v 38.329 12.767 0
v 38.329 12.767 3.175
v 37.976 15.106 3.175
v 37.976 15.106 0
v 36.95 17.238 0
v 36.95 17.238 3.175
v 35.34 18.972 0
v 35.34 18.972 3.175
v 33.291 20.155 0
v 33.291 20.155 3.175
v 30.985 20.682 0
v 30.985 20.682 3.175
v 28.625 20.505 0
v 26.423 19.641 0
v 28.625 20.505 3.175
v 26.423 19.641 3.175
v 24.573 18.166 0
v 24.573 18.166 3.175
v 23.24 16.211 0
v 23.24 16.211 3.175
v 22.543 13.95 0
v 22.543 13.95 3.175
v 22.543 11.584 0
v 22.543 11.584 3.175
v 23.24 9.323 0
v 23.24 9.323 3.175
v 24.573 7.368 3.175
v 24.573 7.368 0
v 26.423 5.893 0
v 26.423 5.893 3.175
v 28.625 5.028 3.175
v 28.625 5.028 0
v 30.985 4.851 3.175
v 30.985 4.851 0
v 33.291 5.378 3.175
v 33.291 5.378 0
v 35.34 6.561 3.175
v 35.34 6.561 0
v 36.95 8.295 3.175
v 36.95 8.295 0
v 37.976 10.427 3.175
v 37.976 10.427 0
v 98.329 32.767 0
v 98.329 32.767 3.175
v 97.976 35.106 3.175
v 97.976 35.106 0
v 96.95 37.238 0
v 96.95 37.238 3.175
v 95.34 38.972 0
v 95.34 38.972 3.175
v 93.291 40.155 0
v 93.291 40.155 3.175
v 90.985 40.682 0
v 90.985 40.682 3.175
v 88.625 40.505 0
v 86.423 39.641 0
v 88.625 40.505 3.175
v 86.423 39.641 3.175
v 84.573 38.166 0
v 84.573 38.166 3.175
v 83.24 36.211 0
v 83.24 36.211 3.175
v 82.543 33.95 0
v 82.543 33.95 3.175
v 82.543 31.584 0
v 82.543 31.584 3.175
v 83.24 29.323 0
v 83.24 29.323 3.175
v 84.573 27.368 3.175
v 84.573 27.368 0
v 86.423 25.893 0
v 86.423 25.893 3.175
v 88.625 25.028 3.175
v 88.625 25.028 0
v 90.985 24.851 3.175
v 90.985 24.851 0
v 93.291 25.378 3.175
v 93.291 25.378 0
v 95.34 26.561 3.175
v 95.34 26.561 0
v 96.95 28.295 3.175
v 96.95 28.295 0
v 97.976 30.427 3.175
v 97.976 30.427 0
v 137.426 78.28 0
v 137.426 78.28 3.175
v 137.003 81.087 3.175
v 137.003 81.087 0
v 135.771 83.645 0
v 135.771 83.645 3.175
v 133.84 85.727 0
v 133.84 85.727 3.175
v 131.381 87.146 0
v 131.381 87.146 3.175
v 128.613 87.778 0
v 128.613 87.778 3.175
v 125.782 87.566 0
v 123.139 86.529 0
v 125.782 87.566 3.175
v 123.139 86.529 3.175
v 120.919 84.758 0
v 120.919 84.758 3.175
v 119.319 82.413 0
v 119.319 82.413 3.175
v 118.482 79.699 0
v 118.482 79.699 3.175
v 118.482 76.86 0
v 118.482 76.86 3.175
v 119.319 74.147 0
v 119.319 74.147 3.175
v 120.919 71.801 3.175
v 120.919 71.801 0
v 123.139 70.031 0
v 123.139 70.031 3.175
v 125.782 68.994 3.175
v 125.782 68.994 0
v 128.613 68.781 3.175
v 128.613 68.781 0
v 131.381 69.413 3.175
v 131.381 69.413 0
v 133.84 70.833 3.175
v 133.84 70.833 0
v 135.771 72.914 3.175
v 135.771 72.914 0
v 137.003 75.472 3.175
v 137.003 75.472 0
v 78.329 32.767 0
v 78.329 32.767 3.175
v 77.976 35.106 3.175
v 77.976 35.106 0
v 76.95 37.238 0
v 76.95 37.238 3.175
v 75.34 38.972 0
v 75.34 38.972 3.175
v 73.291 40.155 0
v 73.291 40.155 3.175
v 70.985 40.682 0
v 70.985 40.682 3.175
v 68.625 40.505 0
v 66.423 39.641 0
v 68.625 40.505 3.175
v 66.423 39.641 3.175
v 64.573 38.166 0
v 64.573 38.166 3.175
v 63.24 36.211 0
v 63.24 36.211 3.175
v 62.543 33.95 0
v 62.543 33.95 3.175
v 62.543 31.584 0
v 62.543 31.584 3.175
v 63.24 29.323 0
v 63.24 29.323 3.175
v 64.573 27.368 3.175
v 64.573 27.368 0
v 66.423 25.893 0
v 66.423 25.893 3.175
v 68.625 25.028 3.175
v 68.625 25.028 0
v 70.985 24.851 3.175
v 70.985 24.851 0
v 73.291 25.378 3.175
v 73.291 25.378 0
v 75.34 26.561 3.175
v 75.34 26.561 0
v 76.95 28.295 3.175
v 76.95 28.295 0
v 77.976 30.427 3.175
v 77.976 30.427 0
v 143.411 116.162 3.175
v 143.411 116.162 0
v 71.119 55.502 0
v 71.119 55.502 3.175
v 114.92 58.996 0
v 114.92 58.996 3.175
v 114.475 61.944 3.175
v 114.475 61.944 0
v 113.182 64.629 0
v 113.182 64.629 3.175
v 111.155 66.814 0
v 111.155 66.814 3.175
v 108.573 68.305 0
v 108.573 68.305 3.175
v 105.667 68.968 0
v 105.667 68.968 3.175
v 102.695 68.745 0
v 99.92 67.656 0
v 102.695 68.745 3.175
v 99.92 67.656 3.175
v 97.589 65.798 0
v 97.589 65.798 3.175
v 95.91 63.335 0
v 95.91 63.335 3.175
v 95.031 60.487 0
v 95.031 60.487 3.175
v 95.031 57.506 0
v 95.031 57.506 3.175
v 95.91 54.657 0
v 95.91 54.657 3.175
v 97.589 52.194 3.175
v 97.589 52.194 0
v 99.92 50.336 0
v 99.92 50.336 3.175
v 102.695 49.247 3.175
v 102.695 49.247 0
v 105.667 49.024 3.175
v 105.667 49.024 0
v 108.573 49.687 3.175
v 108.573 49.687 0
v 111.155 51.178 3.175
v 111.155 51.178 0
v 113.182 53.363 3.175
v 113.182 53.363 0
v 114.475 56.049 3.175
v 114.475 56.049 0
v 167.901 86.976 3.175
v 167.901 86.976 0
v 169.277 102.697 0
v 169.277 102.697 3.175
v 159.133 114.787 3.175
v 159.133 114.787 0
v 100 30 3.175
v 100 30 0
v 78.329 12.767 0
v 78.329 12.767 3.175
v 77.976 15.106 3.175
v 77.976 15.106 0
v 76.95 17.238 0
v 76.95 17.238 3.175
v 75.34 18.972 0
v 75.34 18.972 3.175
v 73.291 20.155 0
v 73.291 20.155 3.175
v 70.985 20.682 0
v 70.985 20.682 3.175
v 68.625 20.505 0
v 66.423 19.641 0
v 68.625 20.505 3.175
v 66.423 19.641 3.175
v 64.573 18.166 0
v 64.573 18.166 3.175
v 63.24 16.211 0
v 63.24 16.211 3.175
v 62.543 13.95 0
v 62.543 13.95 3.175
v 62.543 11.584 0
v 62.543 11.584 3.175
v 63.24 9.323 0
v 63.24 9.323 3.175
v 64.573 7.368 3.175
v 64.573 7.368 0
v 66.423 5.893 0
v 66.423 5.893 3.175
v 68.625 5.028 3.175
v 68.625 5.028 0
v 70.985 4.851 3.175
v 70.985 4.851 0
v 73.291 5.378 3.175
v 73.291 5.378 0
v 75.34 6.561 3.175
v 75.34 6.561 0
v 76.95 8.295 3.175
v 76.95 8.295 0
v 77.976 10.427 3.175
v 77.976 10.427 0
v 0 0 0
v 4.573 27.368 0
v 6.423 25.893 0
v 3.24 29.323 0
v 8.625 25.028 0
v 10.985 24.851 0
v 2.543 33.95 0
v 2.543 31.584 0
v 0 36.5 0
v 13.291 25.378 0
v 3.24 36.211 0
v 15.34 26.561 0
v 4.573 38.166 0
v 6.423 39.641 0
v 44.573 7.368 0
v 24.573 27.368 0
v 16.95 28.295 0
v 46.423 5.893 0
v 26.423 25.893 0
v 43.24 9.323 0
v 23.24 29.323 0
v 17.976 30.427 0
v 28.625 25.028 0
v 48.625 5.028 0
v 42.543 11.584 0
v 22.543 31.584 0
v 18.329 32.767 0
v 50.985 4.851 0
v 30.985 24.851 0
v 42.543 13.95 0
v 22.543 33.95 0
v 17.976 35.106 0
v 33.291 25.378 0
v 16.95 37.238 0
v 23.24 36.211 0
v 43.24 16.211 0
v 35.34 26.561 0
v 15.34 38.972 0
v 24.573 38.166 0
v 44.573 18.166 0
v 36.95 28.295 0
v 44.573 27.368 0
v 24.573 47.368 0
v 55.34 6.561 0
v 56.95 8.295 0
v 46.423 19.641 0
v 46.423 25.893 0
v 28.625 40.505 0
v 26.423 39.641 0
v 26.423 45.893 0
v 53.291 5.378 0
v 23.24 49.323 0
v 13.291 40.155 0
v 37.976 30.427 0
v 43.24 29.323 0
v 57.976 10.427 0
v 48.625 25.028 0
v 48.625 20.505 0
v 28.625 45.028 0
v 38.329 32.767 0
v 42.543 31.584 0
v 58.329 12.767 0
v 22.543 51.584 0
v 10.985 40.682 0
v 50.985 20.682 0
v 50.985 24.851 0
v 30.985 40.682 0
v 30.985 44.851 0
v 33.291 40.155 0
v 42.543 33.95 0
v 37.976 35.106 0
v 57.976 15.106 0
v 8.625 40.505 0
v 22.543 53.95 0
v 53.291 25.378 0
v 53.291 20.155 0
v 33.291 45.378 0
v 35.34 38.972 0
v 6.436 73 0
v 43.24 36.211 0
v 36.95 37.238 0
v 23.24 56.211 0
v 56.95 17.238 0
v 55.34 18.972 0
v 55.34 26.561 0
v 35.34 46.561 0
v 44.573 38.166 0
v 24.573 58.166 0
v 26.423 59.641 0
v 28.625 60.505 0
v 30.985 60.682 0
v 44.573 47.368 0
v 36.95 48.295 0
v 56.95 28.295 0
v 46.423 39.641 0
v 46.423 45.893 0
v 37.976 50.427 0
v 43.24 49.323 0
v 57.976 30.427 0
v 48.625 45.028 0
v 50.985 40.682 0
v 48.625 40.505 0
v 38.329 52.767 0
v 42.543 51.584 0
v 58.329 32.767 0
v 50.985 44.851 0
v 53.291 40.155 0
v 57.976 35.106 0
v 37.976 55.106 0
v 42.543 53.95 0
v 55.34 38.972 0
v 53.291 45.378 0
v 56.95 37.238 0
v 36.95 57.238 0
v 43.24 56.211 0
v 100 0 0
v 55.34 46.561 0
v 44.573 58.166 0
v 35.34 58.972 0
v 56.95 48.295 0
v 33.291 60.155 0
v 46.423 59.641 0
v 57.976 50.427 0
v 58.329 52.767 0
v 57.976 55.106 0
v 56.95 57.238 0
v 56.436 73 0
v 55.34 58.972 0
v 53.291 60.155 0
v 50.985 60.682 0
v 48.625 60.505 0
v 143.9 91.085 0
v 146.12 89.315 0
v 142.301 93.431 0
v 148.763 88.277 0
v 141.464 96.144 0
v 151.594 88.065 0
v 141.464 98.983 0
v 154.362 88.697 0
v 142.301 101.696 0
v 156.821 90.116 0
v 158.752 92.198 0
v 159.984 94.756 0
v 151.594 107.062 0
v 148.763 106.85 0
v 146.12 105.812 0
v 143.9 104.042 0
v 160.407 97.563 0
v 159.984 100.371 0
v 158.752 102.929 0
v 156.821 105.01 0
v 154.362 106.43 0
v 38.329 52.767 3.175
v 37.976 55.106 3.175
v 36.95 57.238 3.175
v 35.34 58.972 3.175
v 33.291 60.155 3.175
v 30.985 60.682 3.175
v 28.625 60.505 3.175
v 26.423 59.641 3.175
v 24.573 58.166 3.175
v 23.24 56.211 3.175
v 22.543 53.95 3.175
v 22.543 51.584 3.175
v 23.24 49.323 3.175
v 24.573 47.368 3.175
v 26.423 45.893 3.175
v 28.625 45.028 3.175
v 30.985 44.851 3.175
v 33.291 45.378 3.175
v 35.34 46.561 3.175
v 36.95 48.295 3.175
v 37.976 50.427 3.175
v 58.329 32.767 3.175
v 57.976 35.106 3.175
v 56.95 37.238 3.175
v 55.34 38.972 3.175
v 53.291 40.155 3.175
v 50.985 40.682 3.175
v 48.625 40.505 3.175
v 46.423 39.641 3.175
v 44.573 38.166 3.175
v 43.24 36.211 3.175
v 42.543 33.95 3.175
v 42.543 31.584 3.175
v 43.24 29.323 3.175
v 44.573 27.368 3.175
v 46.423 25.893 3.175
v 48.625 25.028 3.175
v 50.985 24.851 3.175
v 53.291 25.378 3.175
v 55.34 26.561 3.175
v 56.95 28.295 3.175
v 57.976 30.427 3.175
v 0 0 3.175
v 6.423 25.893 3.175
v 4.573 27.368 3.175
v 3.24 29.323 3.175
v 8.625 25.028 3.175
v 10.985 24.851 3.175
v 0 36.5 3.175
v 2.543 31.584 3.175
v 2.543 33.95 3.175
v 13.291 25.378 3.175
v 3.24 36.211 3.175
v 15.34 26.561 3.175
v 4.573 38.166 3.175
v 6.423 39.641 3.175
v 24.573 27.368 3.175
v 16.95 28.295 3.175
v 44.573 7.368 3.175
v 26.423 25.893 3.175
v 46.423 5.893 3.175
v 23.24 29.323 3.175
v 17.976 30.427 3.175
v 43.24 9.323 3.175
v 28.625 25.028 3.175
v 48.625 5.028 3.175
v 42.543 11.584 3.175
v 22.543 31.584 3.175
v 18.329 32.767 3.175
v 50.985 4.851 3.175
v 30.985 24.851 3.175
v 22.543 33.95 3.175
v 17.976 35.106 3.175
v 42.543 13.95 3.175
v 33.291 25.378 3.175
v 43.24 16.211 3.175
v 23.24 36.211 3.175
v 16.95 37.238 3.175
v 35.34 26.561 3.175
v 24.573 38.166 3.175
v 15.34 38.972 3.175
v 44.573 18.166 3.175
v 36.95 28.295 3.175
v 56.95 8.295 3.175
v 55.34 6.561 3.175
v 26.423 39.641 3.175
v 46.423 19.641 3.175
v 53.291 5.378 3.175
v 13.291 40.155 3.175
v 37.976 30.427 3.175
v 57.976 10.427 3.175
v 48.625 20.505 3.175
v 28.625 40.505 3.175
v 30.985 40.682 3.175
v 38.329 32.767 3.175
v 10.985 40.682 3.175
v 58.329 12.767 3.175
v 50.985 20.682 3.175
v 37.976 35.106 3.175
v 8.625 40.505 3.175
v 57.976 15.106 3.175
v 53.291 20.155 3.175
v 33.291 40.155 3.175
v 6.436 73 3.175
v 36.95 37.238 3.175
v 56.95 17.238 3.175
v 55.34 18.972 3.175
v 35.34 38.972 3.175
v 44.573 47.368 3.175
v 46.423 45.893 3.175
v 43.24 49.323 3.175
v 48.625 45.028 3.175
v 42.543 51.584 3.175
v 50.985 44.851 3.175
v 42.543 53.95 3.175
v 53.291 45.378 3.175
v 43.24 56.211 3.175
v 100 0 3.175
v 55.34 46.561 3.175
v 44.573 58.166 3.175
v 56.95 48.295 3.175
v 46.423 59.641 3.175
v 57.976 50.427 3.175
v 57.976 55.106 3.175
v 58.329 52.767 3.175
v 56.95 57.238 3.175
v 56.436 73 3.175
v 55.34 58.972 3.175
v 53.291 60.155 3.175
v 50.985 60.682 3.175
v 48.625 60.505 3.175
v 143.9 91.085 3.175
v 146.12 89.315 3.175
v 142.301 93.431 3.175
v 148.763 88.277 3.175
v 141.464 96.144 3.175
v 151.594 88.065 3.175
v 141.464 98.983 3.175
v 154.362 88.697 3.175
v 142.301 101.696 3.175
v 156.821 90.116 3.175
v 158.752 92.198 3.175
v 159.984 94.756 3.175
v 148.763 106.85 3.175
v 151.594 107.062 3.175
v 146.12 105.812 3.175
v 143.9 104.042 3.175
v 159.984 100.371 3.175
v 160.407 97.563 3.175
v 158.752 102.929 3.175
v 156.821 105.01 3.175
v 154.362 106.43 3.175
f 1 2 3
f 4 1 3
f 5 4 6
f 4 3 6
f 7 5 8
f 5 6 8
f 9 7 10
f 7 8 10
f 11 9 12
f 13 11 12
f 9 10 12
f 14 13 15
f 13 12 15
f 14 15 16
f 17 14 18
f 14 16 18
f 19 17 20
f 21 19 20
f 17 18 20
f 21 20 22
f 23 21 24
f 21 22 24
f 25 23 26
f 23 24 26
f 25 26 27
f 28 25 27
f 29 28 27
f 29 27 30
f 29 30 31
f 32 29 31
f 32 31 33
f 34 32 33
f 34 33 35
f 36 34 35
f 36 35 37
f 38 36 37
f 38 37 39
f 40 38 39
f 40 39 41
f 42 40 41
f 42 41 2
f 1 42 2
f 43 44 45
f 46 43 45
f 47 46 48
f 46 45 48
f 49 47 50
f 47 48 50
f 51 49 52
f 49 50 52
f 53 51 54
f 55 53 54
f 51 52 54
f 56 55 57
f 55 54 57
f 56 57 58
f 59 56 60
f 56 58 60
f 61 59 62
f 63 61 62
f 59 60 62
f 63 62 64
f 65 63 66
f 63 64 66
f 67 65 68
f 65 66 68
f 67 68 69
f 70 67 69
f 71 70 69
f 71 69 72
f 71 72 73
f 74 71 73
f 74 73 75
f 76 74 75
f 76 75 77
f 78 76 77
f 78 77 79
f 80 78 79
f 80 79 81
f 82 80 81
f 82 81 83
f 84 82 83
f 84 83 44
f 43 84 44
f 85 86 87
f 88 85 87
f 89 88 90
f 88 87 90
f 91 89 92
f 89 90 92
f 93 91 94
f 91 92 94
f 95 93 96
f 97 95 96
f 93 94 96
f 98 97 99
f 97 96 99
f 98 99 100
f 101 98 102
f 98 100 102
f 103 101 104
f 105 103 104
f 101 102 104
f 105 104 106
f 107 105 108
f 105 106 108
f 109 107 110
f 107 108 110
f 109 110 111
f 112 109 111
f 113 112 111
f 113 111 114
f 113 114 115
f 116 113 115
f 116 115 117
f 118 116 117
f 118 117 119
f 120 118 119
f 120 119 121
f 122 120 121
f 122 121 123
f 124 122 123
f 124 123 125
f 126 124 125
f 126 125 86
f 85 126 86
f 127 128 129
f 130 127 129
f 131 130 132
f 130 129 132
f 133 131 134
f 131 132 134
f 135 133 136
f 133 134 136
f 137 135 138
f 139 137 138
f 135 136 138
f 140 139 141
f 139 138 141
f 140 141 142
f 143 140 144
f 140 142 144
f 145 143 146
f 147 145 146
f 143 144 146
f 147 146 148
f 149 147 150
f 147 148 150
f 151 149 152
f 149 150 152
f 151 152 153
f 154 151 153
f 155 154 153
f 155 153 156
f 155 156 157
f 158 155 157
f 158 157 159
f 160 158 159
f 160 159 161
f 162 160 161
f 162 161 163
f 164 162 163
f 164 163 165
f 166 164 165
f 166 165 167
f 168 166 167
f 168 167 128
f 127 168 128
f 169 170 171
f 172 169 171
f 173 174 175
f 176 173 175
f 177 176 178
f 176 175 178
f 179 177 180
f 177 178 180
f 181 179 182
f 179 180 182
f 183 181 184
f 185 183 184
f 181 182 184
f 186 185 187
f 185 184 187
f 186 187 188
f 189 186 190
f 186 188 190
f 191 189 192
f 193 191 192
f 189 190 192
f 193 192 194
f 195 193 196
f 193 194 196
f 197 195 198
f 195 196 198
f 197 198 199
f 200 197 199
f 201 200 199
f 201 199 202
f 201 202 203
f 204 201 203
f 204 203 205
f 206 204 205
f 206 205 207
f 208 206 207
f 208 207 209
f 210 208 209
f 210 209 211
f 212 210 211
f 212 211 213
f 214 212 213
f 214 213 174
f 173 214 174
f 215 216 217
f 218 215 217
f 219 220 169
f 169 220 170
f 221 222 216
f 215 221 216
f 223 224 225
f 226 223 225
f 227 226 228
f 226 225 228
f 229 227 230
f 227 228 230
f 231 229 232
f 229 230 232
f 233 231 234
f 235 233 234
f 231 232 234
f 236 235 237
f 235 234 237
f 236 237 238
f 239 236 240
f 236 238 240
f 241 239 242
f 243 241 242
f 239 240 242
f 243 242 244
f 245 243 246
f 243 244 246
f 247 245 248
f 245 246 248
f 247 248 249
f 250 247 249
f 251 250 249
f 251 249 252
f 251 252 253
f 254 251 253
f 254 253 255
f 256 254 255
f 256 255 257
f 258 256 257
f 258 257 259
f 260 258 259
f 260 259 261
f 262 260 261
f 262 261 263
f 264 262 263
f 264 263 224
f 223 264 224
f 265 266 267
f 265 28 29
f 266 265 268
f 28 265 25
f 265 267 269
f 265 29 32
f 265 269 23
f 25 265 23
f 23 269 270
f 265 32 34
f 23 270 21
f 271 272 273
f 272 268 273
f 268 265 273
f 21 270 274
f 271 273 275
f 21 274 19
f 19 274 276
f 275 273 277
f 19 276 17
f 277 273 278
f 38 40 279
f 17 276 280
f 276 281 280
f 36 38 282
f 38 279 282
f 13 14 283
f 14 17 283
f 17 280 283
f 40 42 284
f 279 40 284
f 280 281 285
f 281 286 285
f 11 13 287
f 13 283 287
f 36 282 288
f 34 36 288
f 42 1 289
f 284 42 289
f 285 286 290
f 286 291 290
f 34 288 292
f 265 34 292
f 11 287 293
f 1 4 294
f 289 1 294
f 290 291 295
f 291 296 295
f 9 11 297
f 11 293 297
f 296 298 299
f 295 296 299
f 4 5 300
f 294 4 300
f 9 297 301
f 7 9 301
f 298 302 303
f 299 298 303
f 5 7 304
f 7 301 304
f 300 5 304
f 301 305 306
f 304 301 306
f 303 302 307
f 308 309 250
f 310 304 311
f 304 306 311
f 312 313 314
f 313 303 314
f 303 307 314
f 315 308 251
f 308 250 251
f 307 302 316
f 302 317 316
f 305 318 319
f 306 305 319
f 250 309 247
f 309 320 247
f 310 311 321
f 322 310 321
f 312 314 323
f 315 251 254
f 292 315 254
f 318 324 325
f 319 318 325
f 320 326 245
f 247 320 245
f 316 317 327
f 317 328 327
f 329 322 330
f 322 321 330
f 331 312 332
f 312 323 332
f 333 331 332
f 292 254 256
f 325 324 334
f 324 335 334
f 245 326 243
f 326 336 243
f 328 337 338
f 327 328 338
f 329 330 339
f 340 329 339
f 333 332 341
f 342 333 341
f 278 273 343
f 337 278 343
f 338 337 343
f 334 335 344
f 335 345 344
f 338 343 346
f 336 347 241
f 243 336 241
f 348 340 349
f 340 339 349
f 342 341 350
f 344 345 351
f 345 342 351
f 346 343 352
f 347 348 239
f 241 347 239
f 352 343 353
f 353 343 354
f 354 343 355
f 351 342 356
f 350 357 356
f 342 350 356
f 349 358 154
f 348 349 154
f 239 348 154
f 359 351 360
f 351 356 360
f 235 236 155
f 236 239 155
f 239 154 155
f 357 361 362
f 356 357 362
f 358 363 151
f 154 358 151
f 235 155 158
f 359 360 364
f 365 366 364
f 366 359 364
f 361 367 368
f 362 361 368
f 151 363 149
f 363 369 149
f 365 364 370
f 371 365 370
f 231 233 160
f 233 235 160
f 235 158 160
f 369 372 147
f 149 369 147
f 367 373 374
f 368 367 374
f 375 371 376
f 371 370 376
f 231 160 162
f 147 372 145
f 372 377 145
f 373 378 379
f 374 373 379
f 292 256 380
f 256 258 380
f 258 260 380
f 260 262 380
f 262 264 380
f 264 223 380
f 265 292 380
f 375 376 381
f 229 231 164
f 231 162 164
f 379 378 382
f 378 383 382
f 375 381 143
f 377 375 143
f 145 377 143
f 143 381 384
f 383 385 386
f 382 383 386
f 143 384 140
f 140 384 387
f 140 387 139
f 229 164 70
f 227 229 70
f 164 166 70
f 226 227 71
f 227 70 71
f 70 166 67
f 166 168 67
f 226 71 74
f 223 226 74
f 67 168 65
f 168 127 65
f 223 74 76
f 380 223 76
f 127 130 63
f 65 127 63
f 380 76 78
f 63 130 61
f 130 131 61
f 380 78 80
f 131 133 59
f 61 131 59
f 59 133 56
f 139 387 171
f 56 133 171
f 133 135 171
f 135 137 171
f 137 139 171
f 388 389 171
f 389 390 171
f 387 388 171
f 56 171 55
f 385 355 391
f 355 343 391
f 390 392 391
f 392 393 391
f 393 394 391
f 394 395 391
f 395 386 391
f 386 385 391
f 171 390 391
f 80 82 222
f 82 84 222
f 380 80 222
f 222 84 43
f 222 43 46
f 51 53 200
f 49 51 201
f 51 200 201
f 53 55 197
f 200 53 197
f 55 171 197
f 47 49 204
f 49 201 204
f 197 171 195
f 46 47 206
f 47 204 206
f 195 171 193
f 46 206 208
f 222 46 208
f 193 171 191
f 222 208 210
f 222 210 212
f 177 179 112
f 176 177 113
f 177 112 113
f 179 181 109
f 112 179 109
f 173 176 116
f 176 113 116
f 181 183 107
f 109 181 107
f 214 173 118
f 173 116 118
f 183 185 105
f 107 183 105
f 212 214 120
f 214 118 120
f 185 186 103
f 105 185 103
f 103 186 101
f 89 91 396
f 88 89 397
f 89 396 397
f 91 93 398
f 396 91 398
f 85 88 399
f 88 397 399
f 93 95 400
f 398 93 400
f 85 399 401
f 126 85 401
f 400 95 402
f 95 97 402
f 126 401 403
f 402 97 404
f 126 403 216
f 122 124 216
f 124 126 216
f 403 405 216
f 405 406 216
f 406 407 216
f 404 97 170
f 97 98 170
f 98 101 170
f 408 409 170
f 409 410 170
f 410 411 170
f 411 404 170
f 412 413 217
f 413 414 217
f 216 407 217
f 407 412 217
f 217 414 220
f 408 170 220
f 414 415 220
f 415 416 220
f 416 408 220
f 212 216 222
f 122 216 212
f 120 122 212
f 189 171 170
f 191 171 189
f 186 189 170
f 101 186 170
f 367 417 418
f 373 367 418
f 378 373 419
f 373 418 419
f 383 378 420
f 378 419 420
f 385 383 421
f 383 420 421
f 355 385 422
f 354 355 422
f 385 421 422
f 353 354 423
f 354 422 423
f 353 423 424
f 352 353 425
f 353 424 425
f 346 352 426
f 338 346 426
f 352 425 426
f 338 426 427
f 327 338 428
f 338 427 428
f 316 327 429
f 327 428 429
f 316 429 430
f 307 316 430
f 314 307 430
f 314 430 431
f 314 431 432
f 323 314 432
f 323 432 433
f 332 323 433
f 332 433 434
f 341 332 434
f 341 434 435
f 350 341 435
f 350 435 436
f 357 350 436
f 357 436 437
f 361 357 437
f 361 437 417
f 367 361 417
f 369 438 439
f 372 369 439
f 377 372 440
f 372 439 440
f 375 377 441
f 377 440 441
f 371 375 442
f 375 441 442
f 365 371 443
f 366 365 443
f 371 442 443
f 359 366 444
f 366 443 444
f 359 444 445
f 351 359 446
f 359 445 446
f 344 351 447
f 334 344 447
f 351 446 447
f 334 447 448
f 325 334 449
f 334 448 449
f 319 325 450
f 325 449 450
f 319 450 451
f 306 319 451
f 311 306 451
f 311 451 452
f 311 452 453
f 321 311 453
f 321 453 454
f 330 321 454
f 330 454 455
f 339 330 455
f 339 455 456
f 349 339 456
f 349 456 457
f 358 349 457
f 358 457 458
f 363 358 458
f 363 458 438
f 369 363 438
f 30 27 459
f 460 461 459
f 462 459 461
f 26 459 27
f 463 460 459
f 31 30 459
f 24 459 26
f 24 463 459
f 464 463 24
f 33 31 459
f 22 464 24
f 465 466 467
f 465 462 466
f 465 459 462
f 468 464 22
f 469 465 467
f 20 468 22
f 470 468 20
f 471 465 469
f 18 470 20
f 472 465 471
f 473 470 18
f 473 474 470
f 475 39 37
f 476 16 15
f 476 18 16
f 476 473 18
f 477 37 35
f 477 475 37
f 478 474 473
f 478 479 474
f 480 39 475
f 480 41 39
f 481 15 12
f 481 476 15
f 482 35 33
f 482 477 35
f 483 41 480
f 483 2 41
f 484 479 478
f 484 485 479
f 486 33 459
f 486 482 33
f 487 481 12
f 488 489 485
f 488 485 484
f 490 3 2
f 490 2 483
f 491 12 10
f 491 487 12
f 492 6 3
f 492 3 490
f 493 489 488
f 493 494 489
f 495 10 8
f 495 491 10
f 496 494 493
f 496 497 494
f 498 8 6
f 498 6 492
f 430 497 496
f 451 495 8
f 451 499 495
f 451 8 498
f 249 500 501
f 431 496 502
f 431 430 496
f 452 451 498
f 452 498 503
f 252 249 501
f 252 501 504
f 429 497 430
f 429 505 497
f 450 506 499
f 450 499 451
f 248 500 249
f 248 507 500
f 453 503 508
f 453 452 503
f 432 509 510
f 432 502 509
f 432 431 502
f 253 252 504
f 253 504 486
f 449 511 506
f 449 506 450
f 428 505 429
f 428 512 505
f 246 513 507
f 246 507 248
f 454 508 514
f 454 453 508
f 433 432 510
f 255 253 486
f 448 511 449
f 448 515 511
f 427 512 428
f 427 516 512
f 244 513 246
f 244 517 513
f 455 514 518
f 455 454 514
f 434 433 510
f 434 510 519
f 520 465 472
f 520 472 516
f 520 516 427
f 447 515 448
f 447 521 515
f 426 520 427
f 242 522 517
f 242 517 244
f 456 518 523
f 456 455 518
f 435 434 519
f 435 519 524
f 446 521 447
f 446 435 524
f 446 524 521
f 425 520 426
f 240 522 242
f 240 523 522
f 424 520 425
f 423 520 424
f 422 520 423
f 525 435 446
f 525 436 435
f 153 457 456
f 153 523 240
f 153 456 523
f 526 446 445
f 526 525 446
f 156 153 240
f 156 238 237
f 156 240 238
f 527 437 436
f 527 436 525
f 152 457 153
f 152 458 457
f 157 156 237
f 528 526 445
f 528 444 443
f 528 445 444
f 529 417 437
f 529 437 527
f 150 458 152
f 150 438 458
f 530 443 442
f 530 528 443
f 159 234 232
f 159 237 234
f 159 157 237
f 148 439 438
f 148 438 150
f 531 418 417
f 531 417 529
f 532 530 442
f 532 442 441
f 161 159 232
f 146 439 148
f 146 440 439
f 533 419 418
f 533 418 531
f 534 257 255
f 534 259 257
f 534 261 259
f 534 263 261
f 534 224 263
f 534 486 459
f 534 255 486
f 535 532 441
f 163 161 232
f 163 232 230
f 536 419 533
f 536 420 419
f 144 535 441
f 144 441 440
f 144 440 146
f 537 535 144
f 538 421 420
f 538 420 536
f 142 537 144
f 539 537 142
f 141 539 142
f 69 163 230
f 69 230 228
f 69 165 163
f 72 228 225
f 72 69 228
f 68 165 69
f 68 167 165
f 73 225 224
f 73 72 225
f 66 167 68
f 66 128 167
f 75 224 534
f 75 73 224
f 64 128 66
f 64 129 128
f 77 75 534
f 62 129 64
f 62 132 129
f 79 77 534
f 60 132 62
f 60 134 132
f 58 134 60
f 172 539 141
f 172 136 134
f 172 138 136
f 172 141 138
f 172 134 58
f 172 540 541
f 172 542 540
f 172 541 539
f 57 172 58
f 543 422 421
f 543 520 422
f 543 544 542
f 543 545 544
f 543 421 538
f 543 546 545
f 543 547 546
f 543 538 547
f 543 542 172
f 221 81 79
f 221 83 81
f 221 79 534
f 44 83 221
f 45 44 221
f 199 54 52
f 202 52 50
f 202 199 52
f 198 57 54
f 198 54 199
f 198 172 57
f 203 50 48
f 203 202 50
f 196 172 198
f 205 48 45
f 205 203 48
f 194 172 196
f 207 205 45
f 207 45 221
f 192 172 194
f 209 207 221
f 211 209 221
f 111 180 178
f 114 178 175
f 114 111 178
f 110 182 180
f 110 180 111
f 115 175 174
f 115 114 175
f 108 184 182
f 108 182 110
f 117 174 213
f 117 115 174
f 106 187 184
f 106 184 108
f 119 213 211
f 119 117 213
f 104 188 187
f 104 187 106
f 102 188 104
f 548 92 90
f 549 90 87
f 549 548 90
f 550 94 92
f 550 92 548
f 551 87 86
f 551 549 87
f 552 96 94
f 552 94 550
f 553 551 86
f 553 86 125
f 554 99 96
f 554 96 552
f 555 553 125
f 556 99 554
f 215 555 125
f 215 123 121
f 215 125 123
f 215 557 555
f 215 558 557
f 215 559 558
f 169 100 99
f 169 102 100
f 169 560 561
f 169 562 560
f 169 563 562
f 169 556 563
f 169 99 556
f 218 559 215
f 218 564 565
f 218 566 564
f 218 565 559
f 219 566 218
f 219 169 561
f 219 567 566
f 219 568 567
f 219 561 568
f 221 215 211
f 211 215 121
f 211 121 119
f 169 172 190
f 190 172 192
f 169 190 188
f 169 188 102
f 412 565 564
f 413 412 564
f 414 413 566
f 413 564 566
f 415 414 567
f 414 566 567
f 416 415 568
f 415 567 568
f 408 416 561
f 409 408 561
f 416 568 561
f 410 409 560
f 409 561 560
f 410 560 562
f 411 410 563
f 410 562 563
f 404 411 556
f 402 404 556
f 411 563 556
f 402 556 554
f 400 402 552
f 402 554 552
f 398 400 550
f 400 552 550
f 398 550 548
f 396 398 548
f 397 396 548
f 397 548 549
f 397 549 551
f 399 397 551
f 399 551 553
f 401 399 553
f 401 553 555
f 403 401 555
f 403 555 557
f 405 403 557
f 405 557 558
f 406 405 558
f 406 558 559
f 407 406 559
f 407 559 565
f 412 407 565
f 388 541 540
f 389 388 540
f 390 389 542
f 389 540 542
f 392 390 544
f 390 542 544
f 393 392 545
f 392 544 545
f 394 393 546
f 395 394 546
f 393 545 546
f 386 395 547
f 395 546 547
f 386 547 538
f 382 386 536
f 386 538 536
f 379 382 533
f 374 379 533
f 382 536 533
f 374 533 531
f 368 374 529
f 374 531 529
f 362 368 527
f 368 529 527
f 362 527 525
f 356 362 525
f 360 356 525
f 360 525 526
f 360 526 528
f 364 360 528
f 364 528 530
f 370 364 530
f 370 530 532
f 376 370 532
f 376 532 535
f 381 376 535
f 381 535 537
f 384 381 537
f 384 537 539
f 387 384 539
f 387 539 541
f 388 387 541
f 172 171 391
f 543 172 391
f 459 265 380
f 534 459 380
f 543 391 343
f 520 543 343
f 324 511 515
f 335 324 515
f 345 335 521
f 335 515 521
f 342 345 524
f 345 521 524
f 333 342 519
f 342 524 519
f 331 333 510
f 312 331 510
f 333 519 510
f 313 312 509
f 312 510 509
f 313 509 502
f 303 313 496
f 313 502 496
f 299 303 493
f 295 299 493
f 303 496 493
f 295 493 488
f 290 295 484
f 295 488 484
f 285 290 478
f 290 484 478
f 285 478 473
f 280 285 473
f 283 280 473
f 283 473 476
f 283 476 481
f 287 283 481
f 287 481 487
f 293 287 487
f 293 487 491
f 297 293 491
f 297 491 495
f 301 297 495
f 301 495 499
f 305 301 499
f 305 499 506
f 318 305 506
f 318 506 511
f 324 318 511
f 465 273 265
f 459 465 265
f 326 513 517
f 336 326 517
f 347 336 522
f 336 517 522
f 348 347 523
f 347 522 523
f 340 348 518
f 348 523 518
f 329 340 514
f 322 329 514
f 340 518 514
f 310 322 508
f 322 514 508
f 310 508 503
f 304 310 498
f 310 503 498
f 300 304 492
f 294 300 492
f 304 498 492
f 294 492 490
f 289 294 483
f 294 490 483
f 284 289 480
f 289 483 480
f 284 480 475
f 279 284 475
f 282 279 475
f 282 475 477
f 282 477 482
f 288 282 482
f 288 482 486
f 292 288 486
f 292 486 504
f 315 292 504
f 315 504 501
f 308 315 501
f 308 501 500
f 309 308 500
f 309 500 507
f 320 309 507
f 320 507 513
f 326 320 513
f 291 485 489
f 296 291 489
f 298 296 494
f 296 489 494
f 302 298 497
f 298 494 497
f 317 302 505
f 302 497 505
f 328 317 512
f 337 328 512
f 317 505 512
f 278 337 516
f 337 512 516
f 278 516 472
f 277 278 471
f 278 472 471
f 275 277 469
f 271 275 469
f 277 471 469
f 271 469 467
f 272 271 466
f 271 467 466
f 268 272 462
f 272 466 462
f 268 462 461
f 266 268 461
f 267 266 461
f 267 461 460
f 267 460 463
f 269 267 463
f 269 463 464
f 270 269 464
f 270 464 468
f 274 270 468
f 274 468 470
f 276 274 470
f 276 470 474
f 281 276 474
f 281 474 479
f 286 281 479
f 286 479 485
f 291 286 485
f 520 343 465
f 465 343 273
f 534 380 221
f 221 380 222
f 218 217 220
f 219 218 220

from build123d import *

# Parameters (mm, degrees)
BASE_EXTRUDE_DEPTH = 3.175
SKETCH3_R          = 9.525
SKETCH3_R_2        = 10
SKETCH3_R_3        = 7.9375
HOLES_DEPTH        = 4.175


with BuildPart() as part:
    # Sketch2 → Base Extrude (new body)
    with BuildSketch(Plane.XY):
        Polygon((0, 0), (100, 0), (100, 30), (167.901300028, 86.97595581), (169.276751583, 102.697439025), (159.132575314, 114.786797538), (143.411092099, 116.162249093), (71.118715891, 55.50174288), (56.435934796, 73), (6.435934796, 73), (0, 36.5), align=None)
    extrude(amount=BASE_EXTRUDE_DEPTH)

    # Sketch3 → Holes (cut, through all)
    with BuildSketch(Plane.XY.offset(3.175)):
        with Locations((150.882386677, 97.563400756)):
            Circle(SKETCH3_R)
        with Locations((127.901053383, 78.279772465)):
            Circle(SKETCH3_R)
        with Locations((104.91972009, 58.996144175)):
            Circle(SKETCH3_R_2)
        with Locations((30.39150811, 52.766671577)):
            Circle(SKETCH3_R_3)
        with Locations((50.39150811, 52.766671577)):
            Circle(SKETCH3_R_3)
        with Locations((10.39150811, 32.766671577)):
            Circle(SKETCH3_R_3)
        with Locations((30.39150811, 32.766671577)):
            Circle(SKETCH3_R_3)
        with Locations((50.39150811, 32.766671577)):
            Circle(SKETCH3_R_3)
        with Locations((70.39150811, 32.766671577)):
            Circle(SKETCH3_R_3)
        with Locations((30.39150811, 12.766671577)):
            Circle(SKETCH3_R_3)
        with Locations((50.39150811, 12.766671577)):
            Circle(SKETCH3_R_3)
        with Locations((70.39150811, 12.766671577)):
            Circle(SKETCH3_R_3)
        with Locations((90.39150811, 32.766671577)):
            Circle(SKETCH3_R_3)
    extrude(amount=-HOLES_DEPTH, mode=Mode.SUBTRACT)


solid = part.part
